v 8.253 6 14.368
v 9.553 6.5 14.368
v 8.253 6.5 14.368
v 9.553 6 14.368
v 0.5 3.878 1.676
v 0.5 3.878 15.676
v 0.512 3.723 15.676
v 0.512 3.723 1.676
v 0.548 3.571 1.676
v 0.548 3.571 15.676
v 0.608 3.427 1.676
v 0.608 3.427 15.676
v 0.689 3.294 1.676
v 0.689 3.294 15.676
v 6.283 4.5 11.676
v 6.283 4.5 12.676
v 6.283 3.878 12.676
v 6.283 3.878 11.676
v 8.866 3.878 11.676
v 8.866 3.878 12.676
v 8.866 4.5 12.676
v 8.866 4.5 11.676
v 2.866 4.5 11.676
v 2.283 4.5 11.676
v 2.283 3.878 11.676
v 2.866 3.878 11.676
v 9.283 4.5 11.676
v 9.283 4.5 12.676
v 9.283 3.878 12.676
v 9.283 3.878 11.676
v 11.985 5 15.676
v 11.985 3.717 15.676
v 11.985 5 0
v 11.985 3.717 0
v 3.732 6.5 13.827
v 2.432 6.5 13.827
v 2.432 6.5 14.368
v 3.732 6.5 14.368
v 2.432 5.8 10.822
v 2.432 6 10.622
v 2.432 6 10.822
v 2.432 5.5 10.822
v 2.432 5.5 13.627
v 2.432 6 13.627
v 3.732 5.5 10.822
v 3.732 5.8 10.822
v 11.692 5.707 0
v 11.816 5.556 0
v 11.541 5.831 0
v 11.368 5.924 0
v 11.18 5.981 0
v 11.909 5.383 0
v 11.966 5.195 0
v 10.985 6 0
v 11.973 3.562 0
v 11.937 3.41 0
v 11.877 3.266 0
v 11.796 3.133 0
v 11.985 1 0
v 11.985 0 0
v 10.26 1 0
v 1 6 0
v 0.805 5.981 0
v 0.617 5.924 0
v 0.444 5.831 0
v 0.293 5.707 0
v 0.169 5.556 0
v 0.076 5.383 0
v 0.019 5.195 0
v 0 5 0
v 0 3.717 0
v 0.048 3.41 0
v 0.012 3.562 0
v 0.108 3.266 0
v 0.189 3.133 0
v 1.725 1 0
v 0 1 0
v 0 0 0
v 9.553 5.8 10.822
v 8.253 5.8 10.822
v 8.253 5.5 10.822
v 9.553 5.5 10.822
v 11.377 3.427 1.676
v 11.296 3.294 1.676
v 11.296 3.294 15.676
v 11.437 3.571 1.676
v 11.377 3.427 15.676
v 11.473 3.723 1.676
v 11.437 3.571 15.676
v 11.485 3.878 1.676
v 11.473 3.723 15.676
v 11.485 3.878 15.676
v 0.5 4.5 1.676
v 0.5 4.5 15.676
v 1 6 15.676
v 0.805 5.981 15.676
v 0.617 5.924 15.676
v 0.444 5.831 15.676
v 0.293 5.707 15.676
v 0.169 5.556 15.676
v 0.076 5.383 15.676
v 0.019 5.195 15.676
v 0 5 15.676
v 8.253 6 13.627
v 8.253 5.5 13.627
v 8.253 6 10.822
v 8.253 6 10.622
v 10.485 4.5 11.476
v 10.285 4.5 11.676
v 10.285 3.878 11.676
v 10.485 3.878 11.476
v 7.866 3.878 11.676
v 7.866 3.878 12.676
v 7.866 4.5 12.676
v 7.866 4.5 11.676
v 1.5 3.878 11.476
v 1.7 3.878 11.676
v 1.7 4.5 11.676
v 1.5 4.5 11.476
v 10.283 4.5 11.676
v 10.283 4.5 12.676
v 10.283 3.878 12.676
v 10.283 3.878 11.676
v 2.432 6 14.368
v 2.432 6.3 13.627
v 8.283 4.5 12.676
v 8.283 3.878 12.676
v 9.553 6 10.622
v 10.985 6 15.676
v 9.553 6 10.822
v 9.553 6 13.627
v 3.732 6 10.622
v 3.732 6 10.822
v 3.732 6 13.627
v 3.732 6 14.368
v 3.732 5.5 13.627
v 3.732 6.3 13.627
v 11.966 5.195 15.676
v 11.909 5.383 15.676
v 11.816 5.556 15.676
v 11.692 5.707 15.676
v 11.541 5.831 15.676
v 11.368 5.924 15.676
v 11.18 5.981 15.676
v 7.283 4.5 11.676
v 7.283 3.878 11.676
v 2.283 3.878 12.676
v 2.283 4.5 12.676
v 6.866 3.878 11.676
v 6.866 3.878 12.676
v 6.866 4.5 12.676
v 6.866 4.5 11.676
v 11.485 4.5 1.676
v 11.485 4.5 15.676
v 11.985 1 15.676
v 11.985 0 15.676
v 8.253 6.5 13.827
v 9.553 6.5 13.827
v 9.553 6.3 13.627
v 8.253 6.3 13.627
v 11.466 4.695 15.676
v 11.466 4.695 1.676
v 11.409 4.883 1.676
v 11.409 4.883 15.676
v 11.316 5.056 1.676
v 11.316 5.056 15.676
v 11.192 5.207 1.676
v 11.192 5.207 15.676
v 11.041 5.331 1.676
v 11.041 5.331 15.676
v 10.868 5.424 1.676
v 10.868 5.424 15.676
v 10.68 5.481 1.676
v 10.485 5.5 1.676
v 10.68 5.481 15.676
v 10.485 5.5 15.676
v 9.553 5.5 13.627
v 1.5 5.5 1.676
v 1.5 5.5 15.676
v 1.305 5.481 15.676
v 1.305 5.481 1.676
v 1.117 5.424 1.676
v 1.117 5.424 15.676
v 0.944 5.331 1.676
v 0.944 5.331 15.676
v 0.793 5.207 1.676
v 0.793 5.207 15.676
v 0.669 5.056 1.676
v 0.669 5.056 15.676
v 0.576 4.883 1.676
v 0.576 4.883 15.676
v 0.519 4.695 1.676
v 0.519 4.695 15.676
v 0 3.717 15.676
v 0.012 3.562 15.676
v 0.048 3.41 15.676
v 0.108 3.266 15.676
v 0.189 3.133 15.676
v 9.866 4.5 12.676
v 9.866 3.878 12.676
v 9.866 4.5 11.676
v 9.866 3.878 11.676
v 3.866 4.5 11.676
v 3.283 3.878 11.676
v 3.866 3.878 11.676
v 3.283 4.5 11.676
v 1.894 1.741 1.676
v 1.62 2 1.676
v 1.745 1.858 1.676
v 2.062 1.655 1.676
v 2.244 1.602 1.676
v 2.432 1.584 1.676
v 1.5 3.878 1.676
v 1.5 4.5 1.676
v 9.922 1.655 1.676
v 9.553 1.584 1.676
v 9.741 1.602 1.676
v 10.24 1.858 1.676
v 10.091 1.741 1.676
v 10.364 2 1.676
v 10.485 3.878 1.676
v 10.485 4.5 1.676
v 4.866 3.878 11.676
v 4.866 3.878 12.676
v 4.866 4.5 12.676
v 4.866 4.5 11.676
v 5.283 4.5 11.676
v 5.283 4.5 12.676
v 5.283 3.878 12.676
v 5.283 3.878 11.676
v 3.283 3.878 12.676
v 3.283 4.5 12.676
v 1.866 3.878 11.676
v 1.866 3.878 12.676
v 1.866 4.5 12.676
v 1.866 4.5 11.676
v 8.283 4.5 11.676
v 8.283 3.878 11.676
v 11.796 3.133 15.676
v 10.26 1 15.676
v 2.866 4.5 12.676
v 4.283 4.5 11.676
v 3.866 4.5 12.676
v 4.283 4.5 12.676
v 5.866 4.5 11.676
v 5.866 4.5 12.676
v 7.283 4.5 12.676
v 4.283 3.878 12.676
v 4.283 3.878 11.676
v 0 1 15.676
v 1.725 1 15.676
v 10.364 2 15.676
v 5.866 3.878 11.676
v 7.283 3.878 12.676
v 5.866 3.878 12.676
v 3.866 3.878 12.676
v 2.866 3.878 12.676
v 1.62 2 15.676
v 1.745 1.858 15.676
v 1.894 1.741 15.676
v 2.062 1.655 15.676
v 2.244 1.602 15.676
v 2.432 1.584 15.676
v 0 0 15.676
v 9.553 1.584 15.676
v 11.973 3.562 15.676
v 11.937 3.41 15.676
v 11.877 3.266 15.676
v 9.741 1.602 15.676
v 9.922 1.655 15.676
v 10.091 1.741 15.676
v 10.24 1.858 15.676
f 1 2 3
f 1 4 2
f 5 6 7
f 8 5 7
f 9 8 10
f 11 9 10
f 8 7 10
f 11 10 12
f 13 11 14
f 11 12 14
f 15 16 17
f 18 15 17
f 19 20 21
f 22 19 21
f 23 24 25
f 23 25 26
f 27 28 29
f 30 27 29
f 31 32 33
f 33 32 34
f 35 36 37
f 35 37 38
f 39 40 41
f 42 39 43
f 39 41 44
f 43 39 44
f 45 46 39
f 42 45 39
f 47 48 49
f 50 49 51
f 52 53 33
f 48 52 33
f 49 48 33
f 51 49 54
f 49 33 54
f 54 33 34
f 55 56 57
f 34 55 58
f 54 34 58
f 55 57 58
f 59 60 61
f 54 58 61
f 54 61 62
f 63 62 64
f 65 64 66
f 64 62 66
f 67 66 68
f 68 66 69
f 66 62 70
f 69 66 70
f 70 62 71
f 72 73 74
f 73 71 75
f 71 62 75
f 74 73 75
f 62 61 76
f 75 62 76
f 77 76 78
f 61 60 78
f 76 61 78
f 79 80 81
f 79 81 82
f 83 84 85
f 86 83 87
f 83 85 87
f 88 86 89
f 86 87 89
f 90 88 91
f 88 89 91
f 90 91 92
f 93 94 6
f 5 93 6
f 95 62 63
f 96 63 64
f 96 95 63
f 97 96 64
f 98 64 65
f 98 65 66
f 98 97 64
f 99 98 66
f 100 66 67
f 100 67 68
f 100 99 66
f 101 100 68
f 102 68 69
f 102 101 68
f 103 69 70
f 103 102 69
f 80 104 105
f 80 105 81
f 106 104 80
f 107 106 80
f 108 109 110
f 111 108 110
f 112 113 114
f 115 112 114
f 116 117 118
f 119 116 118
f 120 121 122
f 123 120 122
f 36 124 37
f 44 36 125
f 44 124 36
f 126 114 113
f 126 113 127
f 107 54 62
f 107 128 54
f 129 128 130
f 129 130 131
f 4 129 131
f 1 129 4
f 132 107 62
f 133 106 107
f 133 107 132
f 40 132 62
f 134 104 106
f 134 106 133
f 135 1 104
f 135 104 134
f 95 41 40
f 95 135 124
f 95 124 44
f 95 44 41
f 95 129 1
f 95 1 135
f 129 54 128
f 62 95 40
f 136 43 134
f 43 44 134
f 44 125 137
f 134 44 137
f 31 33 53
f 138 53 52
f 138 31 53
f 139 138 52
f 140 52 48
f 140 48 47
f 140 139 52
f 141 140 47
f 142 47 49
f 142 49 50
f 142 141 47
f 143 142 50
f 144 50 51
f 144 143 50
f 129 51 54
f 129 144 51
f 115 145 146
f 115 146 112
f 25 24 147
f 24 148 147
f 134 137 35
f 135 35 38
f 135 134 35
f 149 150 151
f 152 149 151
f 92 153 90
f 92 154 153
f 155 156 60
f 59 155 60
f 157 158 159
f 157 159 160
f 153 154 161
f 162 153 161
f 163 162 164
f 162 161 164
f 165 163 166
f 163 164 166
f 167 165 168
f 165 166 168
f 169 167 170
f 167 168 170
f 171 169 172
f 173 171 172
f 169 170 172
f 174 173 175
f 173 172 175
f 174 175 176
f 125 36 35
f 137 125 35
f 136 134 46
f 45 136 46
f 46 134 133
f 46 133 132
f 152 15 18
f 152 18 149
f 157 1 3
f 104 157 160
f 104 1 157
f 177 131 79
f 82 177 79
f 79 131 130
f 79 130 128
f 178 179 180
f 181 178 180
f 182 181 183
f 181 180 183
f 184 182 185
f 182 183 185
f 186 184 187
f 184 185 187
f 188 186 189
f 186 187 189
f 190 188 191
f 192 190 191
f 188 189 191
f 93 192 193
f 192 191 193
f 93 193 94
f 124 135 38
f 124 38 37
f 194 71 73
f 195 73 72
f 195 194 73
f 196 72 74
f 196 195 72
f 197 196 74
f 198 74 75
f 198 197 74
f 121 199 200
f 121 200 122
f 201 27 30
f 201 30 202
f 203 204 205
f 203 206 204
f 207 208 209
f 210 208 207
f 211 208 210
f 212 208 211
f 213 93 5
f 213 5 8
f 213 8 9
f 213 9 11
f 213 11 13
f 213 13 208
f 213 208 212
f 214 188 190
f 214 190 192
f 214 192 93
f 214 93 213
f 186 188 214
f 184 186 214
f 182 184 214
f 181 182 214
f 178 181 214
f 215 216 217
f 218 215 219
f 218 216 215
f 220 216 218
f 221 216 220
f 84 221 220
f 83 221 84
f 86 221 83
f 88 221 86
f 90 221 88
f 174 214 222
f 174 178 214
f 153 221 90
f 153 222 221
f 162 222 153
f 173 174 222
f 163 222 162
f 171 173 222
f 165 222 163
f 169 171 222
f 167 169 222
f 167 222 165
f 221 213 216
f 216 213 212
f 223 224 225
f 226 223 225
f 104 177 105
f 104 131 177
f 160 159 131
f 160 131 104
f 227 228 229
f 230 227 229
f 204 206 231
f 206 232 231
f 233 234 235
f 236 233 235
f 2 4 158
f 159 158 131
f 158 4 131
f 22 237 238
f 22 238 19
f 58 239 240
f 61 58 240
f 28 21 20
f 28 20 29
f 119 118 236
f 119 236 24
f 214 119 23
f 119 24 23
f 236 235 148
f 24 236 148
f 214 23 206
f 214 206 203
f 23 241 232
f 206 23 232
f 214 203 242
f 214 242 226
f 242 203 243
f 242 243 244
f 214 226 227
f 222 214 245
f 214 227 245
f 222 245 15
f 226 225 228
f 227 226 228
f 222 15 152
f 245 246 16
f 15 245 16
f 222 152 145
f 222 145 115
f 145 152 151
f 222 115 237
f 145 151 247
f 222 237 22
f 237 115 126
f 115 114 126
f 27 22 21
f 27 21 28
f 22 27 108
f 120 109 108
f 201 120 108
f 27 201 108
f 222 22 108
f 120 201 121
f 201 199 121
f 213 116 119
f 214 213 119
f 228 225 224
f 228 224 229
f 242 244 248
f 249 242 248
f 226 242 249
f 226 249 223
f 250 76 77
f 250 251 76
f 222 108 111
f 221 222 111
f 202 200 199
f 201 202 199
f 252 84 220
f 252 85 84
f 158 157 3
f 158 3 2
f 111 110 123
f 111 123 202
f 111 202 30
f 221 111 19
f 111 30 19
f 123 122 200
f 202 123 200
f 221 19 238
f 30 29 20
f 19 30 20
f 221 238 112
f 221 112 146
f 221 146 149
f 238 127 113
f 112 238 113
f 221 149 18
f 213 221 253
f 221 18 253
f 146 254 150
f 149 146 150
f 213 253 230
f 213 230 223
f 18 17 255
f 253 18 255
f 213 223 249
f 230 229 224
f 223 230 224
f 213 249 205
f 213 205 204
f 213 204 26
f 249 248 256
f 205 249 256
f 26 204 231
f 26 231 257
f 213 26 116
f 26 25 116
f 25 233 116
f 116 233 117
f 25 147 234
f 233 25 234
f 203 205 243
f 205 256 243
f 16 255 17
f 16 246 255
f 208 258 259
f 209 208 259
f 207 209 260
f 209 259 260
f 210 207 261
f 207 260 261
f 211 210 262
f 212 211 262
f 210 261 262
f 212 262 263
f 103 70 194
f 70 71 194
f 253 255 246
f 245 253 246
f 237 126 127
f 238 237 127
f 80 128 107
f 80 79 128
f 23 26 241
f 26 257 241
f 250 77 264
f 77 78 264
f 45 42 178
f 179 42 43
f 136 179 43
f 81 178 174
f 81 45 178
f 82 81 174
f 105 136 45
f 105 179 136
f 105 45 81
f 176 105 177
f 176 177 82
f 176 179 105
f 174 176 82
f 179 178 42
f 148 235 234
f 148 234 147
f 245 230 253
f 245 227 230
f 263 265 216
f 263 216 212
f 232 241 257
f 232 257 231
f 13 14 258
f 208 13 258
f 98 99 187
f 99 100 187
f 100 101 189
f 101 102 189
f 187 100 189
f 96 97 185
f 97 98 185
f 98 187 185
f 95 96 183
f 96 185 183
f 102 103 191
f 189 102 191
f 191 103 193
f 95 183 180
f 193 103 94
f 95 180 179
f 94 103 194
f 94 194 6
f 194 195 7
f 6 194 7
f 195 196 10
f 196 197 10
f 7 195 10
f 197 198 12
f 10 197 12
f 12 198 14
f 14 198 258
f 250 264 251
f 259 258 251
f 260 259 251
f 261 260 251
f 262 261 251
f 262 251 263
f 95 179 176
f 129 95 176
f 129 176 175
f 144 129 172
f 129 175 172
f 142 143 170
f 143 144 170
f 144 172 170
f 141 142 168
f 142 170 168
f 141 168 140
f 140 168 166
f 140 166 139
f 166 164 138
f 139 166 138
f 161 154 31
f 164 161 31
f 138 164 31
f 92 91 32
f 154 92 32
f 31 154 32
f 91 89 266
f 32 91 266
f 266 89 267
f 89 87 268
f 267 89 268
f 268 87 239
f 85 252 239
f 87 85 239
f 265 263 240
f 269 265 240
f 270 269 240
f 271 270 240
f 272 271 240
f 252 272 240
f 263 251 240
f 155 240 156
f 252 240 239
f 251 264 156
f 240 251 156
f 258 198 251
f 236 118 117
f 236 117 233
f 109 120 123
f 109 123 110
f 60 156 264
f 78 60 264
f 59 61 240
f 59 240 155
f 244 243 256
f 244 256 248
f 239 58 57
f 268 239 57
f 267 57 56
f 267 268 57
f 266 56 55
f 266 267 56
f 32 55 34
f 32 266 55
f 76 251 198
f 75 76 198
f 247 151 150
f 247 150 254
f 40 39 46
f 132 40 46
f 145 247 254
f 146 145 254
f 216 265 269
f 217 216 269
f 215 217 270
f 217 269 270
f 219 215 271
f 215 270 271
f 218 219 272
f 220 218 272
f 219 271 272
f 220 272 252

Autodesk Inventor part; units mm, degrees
ref_plane "YZ Plane" through (0, 0, 0) normal (1, 0, 0) x (0, 1, 0)
ref_plane "XZ Plane" through (0, 0, 0) normal (0, 1, 0) x (-1, 0, 0)
ref_plane "XY Plane" through (0, 0, 0) normal (0, 0, 1) x (1, 0, 0)
sketch "Sketch1" plane through (0, 0, 0) normal (0, 1, 0) x (-1, 0, 0)
  line L0 (0, 0) -> (0, 15.676)
  line L1 (0, 15.676) -> (-11.985, 15.676)
  line L2 (-11.985, 15.676) -> (-11.985, 0)
  line L3 (-11.985, 0) -> (0, 0)
  dimension "d1" = 15.676
  dimension "d2" = 11.985
extrude "Extrusion1" add sketch "Sketch1" along normal blind 6
sketch "Sketch2" plane through (0, 0, 15.676) normal (0, 0, 1) x (1, 0, 0)
  line L0 (11.985, 0) -> (0, 0) projected
  line L1 (0, 0) -> (0, 6) projected
  line L2 (11.985, 0) -> (11.985, 6) projected
  line L3 (1.7246, 1) -> (10.26, 1)
  line L4 (1.7246, 1) -> (0.1886, 3.1326)
  line L5 (11.7964, 3.1326) -> (10.26, 1)
  line L6 (0, 3.717) -> (0, 5)
  line L7 (1, 6) -> (10.985, 6)
  line L8 (11.985, 5) -> (11.985, 3.7171)
  line L9 (1.7246, 1) -> (0, 1)
  line L10 (10.26, 1) -> (11.985, 1)
  arc A0 (1, 6) -> (0, 5) centre (1, 5) ccw
  arc A1 (11.985, 5) -> (10.985, 6) centre (10.985, 5) ccw
  line L11 (1, 6) -> (10.985, 6)
  line L12 (11.985, 6) -> (0, 6) projected
  arc A2 (0, 3.717) -> (0.1886, 3.1326) centre (1, 3.717) ccw
  arc A3 (11.7964, 3.1326) -> (11.985, 3.7171) centre (10.985, 3.7171) ccw
  line L13 (0, 5) -> (0.5, 5)
  arc A4 (1.5, 5.5) -> (0.5, 4.5) centre (1.5, 4.5) ccw
  line L14 (1.5, 5.5) -> (10.485, 5.5)
  arc A5 (11.485, 4.5) -> (10.485, 5.5) centre (10.485, 4.5) ccw
  line L15 (0.5, 4.5) -> (0.5, 3.8784)
  line L16 (0.6886, 3.2939) -> (1.6205, 2)
  arc A6 (0.5, 3.8784) -> (0.6886, 3.2939) centre (1.5, 3.8784) ccw
  line L17 (11.2964, 3.2939) -> (10.3641, 1.9999)
  line L18 (9.5528, 1.5845) -> (2.4319, 1.5845)
  line L19 (11.485, 4.5) -> (11.485, 3.8785)
  arc A7 (11.2964, 3.2939) -> (11.485, 3.8785) centre (10.485, 3.8785) ccw
  arc A8 (1.6205, 2) -> (2.4319, 1.5845) centre (2.4319, 2.5845) ccw
  arc A9 (9.5528, 1.5845) -> (10.3641, 1.9999) centre (9.5528, 2.5845) ccw
  line L20 (1.5, 4.5) -> (10.485, 4.5)
  line L21 (10.485, 4.5) -> (10.485, 3.8785)
  line L22 (10.485, 3.8785) -> (1.5, 3.8785)
  line L23 (1.5, 3.8785) -> (1.5, 4.5)
  line L24 (1.866, 4.5) -> (2.2834, 4.5)
  line L25 (2.2834, 4.5) -> (2.2834, 3.8785)
  line L26 (2.2834, 3.8785) -> (1.866, 3.8785)
  line L27 (1.866, 3.8785) -> (1.866, 4.5)
  line L28 (3.2834, 4.5) -> (3.2834, 3.8785)
  line L29 (2.866, 4.5) -> (3.2834, 4.5)
  line L30 (2.866, 3.8785) -> (2.866, 4.5)
  line L31 (3.2834, 3.8785) -> (2.866, 3.8785)
  line L32 (4.2834, 4.5) -> (4.2834, 3.8785)
  line L33 (3.866, 4.5) -> (4.2834, 4.5)
  line L34 (3.866, 3.8785) -> (3.866, 4.5)
  line L35 (4.2834, 3.8785) -> (3.866, 3.8785)
  line L36 (5.2834, 4.5) -> (5.2834, 3.8785)
  line L37 (4.866, 4.5) -> (5.2834, 4.5)
  line L38 (4.866, 3.8785) -> (4.866, 4.5)
  line L39 (5.2834, 3.8785) -> (4.866, 3.8785)
  line L40 (6.2834, 4.5) -> (6.2834, 3.8785)
  line L41 (5.866, 4.5) -> (6.2834, 4.5)
  line L42 (5.866, 3.8785) -> (5.866, 4.5)
  line L43 (6.2834, 3.8785) -> (5.866, 3.8785)
  line L44 (7.2834, 4.5) -> (7.2834, 3.8785)
  line L45 (6.866, 4.5) -> (7.2834, 4.5)
  line L46 (6.866, 3.8785) -> (6.866, 4.5)
  line L47 (7.2834, 3.8785) -> (6.866, 3.8785)
  line L48 (8.2834, 4.5) -> (8.2834, 3.8785)
  line L49 (7.866, 4.5) -> (8.2834, 4.5)
  line L50 (7.866, 3.8785) -> (7.866, 4.5)
  line L51 (8.2834, 3.8785) -> (7.866, 3.8785)
  line L52 (9.2834, 4.5) -> (9.2834, 3.8785)
  line L53 (8.866, 4.5) -> (9.2834, 4.5)
  line L54 (8.866, 3.8785) -> (8.866, 4.5)
  line L55 (9.2834, 3.8785) -> (8.866, 3.8785)
  line L56 (10.2834, 4.5) -> (10.2834, 3.8785)
  line L57 (9.866, 4.5) -> (10.2834, 4.5)
  line L58 (9.866, 3.8785) -> (9.866, 4.5)
  line L59 (10.2834, 3.8785) -> (9.866, 3.8785)
  line L60 (0, 6) -> (1, 6)
  line L61 (0, 6) -> (0, 5)
  line L62 (10.985, 6) -> (11.985, 6)
  line L63 (11.985, 6) -> (11.985, 5)
  line L64 (11.985, 3.7171) -> (11.985, 1)
  line L65 (0, 3.717) -> (0, 1)
  point P0 (0, 3.3944)
  point P1 (11.985, 3.3944)
  dimension "d7" = 1
  dimension "d8" = 1
  dimension "d9" = 1
  dimension "d12" = 1
  dimension "d14" = 1
  dimension "d16" = 1
  dimension "d18" = 1
  dimension "d19" = 1
  dimension "d20" = 1
  dimension "d23" = 1
extrude "Extrusion2" cut sketch "Sketch2" against normal blind 16 contours L10 L5 A3 L2 | L1 A2 L4 L9 | A1 L12 L2 | L1 L12 A0
extrude "Extrusion3" cut sketch "Sketch2" against normal blind 14 contours L14 A5 L19 A7 L17 A9 L18 A8 L16 A6 L15 A4
extrude "Extrusion4" cut sketch "Sketch2" against normal blind 4 contours L20 L27 L22 L23 | L20 L30 L22 L25 | L20 L34 L22 L28 | L20 L38 L22 L32 | L20 L42 L22 L36 | L20 L46 L22 L40 | L20 L50 L22 L44 | L20 L54 L22 L48 | L20 L58 L22 L52 | L20 L21 L22 L56
extrude "Extrusion5" cut sketch "Sketch2" against normal blind 3 contours L20 L25 L22 L27 | L20 L28 L22 L30 | L20 L34 L22 L28 | L20 L32 L22 L34 | L20 L38 L22 L32 | L20 L36 L22 L38 | L20 L42 L22 L36 | L20 L40 L22 L42 | L20 L46 L22 L40 | L20 L44 L22 L46 | L20 L50 L22 L44 | L20 L48 L22 L50 | L20 L54 L22 L48 | L20 L52 L22 L54 | L20 L58 L22 L52 | L20 L56 L22 L58 | L20 L21 L22 L56
sketch "Sketch3" plane through (0, 6, 0) normal (0, 1, 0) x (1, 0, 0)
  line L0 (2.4319, -10.8223) -> (2.4319, -13.627)
  line L1 (2.4319, -15.676) -> (2.4319, -1.676) projected
  line L2 (2.4319, -10.8223) -> (2.4319, -13.627)
  line L3 (2.4319, -13.627) -> (3.7319, -13.627)
  line L4 (3.7319, -13.627) -> (3.7319, -10.8223)
  line L5 (3.7319, -10.8223) -> (2.4319, -10.8223)
  line L6 (9.5528, -15.676) -> (9.5528, -1.676) projected
  line L7 (9.5528, -10.8223) -> (9.5528, -13.627)
  line L8 (9.5528, -13.627) -> (8.2528, -13.627)
  line L9 (8.2528, -13.627) -> (8.2528, -10.8223)
  line L10 (8.2528, -10.8223) -> (9.5528, -10.8223)
  line L11 (2.4319, -13.627) -> (3.7319, -13.627)
  line L12 (3.7319, -13.627) -> (3.7319, -14.3676)
  line L13 (3.7319, -14.3676) -> (2.4319, -14.3676)
  line L14 (2.4319, -14.3676) -> (2.4319, -13.627)
  line L15 (8.2528, -13.627) -> (9.5528, -13.627)
  line L16 (9.5528, -13.627) -> (9.5528, -14.3676)
  line L17 (9.5528, -14.3676) -> (8.2528, -14.3676)
  line L18 (8.2528, -14.3676) -> (8.2528, -13.627)
  point P0 (0, 0)
  dimension "d38" = 1.3
  dimension "d40" = 1.3
extrude "Extrusion6" cut sketch "Sketch3" against normal blind 1 contours L5 L4 L3 L0 | L8 L9 L10 L6
extrude "Extrusion7" add sketch "Sketch3" along normal blind 0.5 contours L3 L12 L13 L1 | L17 L18 L8 L6
chamfer "Chamfer1" distance 0.2 angle 45 3 edges at (1.5, 4.1892, 11.676) (10.485, 4.1892, 11.676) (8.9028, 6.5, 13.627)
chamfer "Chamfer2" distance 0.2 angle 45 1 edges at (3.0819, 6.5, 13.627)
chamfer "Chamfer3" distance 0.2 angle 45 2 edges at (3.0819, 6, 10.8223) (8.9028, 6, 10.8223)
properties part number "Port 3"
